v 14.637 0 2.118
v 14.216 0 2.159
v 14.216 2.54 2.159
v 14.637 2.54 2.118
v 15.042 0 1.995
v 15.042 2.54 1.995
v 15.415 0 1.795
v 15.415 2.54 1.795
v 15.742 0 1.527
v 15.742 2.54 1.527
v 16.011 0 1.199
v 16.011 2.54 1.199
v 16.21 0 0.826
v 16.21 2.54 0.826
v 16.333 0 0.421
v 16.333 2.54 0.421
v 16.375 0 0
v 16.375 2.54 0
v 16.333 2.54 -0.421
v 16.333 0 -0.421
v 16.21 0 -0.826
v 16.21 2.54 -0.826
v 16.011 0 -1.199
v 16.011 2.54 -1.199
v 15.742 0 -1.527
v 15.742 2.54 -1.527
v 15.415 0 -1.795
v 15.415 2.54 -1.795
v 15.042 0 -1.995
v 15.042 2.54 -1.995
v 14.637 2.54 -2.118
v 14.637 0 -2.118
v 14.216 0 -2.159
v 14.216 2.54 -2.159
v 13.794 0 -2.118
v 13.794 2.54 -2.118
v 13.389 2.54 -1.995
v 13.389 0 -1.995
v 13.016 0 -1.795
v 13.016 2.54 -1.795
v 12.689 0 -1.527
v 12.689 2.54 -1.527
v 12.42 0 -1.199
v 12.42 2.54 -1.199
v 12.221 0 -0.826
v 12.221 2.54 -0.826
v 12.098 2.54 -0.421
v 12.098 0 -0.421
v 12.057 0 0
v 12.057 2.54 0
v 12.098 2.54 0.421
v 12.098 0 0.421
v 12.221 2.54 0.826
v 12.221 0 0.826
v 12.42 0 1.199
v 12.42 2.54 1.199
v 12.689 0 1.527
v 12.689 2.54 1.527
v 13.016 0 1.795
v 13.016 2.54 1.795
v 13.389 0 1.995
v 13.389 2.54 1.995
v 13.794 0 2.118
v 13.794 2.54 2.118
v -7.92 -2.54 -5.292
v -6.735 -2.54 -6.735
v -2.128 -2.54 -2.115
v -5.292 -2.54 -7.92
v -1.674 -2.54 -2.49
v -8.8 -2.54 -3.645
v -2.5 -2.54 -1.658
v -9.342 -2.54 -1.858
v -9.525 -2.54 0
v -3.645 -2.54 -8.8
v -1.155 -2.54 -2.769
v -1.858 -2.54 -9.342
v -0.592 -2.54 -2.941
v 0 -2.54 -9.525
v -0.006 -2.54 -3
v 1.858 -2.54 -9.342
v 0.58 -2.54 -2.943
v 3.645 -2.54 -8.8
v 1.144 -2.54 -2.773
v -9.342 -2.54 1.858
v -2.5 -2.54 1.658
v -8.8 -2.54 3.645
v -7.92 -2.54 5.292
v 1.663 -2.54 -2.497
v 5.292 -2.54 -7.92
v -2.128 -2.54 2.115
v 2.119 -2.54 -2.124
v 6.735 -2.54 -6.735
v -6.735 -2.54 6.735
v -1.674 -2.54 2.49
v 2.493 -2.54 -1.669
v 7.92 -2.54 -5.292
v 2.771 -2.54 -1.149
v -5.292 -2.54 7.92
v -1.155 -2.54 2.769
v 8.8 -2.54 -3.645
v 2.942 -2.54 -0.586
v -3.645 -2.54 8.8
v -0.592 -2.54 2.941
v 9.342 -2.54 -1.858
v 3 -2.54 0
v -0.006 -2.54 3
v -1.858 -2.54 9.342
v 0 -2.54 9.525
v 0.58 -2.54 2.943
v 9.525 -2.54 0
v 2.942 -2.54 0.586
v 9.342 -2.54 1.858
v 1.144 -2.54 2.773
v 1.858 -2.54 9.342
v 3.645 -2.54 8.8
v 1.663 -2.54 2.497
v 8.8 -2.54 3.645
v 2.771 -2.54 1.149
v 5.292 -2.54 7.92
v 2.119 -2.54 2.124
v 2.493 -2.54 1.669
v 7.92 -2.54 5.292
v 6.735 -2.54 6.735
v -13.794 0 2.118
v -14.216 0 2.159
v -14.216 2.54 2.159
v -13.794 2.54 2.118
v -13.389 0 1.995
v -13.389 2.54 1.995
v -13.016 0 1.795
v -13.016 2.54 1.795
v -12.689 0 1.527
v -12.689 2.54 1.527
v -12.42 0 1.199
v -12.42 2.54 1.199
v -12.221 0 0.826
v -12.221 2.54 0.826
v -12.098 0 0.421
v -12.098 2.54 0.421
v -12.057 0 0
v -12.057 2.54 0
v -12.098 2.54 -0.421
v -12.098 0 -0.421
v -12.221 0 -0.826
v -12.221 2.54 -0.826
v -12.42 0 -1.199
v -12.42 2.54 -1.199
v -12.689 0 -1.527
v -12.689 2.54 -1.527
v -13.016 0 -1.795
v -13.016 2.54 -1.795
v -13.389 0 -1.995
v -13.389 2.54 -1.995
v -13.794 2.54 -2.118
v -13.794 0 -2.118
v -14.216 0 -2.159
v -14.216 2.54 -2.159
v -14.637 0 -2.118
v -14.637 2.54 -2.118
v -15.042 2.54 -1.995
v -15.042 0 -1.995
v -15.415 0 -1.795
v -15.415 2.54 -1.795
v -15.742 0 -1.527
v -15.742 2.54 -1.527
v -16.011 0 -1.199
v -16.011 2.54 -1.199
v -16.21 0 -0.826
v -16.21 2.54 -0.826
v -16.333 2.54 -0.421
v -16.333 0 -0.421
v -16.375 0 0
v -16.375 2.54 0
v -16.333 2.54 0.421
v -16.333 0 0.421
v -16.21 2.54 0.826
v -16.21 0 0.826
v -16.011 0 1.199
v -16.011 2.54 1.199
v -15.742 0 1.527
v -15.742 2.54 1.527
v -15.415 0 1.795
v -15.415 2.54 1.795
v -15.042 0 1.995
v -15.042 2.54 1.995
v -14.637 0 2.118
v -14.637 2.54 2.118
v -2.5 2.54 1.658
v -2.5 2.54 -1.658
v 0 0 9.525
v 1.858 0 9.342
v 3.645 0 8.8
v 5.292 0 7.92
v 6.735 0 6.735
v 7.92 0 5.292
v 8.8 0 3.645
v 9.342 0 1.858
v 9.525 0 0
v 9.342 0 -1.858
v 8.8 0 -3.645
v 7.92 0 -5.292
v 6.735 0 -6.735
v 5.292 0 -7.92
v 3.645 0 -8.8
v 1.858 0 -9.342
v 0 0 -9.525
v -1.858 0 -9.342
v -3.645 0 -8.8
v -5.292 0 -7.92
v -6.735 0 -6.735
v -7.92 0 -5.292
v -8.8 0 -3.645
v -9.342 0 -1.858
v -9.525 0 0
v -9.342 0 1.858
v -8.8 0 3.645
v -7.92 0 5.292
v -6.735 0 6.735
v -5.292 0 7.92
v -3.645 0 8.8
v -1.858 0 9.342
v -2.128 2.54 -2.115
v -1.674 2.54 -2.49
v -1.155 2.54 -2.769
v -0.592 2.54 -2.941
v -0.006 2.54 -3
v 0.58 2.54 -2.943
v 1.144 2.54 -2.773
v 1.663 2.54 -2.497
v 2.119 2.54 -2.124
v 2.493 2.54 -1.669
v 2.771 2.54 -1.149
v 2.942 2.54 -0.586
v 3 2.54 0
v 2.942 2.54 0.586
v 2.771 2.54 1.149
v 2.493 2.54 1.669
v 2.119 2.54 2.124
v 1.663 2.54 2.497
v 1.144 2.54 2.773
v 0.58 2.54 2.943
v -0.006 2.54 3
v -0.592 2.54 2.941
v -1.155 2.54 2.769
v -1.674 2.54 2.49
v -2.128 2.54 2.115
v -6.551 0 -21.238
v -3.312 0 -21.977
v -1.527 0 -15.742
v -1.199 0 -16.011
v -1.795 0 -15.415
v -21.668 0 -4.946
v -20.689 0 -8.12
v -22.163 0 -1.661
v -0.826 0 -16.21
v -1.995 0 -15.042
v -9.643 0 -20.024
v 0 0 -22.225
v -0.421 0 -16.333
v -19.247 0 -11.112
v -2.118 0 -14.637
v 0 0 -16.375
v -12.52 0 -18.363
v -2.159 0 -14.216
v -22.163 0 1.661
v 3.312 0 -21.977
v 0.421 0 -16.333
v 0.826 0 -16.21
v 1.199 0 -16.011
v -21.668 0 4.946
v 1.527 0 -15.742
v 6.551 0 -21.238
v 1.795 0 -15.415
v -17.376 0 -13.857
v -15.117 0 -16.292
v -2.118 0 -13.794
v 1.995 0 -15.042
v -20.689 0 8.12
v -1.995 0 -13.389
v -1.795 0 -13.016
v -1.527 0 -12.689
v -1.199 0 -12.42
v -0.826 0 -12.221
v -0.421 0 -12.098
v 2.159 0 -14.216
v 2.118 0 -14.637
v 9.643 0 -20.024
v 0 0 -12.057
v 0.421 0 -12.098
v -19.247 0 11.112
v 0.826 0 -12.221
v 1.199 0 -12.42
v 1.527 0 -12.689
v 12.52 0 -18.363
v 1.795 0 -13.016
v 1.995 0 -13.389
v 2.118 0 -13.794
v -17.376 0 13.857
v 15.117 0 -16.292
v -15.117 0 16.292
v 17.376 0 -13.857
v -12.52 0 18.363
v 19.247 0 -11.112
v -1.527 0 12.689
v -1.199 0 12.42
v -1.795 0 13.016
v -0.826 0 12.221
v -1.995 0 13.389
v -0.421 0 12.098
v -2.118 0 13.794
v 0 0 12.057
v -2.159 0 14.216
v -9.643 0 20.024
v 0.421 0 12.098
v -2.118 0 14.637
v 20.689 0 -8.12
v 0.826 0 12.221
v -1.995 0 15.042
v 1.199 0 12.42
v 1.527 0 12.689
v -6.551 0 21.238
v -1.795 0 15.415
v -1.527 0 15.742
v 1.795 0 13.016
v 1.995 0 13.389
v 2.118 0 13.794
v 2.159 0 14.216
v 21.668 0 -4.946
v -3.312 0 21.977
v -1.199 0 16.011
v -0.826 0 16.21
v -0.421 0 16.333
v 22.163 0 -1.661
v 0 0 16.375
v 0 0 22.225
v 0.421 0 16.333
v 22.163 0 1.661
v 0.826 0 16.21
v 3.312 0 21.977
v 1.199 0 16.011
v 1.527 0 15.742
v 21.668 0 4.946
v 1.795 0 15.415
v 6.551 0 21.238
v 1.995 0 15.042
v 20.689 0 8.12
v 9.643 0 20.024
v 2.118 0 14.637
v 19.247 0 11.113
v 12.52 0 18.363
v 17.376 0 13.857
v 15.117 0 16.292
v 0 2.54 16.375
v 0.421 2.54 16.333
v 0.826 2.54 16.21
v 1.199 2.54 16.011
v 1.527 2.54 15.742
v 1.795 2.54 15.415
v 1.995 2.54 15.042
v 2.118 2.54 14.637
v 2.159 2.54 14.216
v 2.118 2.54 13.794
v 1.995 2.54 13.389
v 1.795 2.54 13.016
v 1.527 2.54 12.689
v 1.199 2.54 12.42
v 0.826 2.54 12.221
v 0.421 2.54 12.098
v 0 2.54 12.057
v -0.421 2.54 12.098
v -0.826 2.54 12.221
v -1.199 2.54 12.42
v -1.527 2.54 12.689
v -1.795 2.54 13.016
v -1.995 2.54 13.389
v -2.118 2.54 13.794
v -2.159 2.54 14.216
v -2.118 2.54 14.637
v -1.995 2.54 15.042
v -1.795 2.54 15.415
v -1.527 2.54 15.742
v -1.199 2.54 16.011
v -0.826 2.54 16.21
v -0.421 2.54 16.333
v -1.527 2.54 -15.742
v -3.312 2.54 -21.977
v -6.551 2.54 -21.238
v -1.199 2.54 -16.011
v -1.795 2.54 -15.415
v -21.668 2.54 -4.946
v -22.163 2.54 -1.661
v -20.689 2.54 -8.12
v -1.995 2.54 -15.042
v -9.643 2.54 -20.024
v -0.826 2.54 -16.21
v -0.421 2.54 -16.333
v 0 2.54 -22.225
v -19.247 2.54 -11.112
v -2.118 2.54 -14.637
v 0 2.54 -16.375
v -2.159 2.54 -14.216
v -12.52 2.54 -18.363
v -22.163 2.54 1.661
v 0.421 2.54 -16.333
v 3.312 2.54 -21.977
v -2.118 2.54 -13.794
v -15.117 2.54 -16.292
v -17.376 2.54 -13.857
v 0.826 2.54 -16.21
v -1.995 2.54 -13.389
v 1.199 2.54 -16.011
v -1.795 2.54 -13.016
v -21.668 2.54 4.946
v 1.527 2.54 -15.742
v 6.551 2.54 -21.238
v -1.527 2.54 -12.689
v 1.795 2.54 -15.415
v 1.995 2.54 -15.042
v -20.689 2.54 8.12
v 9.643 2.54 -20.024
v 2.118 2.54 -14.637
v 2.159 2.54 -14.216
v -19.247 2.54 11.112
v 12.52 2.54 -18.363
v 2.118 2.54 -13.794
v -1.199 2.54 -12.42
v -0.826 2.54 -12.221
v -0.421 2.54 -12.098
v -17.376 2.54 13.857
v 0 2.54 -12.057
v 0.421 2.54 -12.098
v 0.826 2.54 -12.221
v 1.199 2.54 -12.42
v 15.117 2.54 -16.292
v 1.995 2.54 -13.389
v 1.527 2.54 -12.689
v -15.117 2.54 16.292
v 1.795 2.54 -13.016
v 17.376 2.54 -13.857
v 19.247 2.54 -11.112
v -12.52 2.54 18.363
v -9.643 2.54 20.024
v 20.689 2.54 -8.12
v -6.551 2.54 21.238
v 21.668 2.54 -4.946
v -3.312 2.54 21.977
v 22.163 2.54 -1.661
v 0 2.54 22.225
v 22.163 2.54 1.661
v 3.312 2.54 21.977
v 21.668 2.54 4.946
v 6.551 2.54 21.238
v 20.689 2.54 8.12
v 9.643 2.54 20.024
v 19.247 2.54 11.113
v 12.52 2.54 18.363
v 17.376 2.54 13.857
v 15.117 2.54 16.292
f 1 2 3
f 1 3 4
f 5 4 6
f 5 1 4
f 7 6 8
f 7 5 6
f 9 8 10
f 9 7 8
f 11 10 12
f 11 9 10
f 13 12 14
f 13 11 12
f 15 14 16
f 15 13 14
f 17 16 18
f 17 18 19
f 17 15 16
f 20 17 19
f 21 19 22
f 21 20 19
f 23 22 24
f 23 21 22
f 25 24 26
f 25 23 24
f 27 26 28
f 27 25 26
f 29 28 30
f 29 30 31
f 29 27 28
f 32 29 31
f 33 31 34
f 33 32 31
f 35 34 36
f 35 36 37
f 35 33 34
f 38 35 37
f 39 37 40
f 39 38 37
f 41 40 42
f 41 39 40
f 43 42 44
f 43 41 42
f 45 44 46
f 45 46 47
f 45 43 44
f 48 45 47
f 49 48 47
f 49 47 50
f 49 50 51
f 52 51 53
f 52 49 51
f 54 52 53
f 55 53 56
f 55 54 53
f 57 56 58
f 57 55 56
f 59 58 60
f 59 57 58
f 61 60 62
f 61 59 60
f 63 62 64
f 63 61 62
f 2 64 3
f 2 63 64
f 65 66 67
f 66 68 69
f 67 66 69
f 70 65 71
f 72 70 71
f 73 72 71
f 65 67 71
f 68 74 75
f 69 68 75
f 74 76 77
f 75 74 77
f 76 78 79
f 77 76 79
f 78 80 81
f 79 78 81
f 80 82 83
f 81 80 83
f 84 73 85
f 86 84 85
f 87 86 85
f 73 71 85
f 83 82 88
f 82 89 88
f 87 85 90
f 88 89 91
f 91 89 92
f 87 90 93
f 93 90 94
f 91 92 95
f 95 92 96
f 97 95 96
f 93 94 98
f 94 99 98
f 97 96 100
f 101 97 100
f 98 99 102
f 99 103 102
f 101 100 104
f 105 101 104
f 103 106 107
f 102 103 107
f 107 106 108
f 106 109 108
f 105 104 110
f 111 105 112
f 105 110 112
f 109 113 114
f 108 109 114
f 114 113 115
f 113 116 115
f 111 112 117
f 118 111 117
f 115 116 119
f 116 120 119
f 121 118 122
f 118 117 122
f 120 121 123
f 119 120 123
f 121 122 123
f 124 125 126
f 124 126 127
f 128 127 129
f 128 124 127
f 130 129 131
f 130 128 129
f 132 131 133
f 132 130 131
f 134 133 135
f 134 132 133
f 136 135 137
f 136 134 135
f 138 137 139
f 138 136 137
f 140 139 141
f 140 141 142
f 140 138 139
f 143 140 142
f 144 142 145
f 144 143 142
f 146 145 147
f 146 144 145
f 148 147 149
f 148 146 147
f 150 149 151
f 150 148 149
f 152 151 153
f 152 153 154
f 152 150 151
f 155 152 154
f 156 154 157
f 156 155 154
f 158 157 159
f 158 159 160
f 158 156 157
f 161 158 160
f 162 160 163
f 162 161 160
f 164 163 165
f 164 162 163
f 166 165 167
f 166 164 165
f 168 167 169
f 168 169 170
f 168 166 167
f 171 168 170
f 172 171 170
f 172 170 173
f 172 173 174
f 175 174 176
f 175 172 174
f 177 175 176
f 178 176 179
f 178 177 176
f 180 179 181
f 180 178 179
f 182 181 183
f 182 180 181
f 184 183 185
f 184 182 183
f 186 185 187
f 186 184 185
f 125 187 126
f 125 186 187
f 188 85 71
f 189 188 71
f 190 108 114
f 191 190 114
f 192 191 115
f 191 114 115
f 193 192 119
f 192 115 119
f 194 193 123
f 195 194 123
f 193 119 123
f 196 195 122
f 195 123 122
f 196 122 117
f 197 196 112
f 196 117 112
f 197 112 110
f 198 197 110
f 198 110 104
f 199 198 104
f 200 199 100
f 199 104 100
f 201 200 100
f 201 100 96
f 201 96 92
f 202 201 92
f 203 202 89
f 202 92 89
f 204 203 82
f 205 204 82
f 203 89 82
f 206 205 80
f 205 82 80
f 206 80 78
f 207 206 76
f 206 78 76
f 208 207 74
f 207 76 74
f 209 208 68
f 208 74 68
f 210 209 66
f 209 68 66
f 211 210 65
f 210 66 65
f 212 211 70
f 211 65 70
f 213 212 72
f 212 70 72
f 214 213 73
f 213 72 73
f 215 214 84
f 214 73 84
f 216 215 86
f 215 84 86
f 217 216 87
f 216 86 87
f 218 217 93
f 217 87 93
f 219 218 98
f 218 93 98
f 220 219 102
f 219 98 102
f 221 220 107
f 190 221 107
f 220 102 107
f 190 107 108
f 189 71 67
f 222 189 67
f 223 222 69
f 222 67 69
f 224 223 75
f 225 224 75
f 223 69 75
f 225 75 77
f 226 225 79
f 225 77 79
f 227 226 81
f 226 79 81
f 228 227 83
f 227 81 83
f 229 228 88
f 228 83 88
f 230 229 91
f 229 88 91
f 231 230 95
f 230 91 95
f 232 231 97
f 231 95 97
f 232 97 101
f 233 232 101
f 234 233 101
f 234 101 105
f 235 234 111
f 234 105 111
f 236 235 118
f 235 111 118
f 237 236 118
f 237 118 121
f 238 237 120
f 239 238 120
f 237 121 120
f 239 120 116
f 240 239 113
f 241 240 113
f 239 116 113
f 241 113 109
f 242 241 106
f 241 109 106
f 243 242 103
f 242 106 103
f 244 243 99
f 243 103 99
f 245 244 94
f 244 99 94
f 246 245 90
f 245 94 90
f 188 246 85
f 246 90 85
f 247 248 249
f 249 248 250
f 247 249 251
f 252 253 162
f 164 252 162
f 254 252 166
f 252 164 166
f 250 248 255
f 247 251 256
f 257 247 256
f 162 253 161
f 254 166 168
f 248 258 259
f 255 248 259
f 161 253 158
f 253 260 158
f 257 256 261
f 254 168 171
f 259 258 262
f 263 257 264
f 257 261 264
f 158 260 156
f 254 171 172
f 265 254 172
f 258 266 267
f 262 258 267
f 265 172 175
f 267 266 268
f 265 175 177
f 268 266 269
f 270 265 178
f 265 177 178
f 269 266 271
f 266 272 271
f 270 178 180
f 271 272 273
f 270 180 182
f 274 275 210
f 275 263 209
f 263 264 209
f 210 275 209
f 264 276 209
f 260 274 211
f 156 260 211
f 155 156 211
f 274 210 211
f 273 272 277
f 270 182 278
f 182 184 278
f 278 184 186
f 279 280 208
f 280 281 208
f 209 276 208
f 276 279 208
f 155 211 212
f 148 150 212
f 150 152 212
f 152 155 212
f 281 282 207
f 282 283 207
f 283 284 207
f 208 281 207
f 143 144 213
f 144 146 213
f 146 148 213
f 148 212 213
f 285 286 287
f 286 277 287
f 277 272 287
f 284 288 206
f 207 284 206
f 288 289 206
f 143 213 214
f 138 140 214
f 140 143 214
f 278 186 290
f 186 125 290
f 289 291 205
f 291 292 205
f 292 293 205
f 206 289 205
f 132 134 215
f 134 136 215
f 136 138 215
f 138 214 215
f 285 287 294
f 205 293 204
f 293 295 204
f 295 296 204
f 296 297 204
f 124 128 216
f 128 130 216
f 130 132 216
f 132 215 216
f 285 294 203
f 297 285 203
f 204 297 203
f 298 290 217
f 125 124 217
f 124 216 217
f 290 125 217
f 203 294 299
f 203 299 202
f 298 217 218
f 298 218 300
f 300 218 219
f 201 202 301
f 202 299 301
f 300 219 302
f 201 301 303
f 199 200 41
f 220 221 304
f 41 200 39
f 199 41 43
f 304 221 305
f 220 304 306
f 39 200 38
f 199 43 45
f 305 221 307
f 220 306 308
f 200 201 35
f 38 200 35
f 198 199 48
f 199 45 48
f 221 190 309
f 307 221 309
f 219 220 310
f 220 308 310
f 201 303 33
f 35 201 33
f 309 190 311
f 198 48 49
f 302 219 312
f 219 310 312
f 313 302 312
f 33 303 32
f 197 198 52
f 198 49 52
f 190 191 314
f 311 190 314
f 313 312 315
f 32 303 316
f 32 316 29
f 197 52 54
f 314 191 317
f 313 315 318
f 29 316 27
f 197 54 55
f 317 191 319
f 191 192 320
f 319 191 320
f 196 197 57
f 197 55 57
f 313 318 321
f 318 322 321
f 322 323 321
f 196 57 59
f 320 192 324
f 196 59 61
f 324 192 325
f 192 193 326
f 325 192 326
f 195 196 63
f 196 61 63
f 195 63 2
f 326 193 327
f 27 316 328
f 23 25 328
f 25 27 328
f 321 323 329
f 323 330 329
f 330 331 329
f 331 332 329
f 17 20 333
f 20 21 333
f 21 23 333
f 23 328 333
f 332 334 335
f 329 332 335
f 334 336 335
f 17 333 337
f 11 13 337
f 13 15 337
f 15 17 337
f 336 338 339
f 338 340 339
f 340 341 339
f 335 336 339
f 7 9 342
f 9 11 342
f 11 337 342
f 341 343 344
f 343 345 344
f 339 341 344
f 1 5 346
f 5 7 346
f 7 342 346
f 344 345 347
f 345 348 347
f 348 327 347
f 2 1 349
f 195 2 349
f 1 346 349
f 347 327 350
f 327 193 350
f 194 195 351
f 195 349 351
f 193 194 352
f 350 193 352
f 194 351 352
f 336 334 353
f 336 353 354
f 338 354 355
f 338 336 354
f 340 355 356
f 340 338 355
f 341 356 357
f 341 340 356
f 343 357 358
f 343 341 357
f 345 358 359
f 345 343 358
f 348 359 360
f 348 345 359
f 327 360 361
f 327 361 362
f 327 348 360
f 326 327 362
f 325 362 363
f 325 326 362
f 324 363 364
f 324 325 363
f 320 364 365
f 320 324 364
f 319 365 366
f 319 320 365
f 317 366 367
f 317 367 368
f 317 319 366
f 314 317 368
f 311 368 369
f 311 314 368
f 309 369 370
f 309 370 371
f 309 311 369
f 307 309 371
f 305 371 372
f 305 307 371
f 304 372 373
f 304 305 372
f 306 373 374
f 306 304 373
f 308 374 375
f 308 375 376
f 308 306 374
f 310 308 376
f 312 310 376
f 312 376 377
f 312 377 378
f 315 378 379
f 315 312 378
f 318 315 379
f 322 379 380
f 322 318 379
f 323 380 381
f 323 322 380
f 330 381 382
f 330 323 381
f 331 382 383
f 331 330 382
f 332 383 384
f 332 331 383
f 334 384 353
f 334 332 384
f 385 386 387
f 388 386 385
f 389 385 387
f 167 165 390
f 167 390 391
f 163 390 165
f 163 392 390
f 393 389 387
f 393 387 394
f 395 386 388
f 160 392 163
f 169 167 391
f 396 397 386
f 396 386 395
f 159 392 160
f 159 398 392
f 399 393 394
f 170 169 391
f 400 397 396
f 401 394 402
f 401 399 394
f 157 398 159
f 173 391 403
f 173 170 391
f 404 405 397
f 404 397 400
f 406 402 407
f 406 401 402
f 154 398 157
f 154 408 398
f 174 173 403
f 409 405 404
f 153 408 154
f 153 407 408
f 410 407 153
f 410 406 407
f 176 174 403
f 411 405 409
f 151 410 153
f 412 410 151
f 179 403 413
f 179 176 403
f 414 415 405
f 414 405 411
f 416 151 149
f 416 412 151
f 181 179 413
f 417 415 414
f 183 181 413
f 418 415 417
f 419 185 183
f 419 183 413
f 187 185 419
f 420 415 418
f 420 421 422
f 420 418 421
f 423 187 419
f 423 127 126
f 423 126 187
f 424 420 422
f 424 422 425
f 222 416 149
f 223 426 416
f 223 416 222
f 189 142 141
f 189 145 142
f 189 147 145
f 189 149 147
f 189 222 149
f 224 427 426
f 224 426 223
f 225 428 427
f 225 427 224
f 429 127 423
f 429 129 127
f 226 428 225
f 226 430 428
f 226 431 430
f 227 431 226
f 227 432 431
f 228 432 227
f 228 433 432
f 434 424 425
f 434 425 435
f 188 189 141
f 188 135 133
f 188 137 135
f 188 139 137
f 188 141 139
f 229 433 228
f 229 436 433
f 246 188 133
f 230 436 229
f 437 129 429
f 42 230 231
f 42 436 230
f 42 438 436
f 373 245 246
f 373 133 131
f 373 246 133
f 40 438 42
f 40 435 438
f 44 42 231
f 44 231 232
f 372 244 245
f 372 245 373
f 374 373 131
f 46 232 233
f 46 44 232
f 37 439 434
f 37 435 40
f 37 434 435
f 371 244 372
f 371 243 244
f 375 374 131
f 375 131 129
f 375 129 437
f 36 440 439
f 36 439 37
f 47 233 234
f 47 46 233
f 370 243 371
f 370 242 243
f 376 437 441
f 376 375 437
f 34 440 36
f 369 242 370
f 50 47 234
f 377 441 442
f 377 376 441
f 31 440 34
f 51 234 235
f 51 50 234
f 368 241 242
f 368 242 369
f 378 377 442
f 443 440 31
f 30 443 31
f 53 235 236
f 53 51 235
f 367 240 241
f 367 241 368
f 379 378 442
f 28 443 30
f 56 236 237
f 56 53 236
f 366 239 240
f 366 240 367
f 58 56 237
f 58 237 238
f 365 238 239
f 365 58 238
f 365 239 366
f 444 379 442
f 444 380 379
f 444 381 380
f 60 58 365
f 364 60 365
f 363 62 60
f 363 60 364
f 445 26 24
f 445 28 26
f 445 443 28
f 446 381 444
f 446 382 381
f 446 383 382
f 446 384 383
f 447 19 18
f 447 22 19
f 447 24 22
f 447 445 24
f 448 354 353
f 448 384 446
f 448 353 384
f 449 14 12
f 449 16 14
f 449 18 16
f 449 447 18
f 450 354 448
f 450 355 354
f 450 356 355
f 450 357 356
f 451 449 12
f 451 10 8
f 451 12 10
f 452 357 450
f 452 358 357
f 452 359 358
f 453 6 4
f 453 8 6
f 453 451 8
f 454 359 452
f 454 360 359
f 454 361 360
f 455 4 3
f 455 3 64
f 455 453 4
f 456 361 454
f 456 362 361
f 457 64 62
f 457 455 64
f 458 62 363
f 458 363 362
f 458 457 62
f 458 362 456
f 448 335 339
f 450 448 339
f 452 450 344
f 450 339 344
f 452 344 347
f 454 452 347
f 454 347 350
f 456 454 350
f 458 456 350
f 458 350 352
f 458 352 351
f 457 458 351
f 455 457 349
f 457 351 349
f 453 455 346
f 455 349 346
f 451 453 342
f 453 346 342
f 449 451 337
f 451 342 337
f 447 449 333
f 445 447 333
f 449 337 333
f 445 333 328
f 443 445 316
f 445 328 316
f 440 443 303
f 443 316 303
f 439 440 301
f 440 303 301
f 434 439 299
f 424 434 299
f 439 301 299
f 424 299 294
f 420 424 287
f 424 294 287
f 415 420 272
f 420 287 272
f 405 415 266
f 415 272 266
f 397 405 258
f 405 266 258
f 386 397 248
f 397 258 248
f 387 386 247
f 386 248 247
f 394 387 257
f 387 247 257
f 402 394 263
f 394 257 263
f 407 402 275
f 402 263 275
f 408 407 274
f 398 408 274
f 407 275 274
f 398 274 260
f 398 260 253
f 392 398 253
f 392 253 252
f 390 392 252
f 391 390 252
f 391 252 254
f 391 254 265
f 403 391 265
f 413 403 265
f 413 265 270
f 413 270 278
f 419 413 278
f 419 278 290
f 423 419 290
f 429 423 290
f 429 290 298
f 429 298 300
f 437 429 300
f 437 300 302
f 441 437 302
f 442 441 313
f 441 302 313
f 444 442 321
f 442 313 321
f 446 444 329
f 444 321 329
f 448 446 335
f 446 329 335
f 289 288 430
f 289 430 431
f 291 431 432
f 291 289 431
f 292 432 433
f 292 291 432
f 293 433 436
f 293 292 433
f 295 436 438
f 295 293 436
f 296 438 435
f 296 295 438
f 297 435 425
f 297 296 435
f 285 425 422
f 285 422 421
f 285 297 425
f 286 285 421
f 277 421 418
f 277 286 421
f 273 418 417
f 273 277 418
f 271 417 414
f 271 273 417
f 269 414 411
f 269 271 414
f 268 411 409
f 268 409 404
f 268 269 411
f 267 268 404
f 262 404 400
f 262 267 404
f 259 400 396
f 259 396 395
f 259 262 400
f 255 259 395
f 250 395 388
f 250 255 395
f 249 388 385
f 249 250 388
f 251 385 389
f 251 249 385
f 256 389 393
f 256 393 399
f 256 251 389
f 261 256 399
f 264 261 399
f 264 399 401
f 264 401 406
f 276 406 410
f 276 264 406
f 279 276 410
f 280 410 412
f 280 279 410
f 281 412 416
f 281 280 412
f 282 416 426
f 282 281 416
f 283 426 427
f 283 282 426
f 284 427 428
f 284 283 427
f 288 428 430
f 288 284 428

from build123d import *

# Parameters (mm, degrees)
SKETCH1_R           = 22.225
SKETCH1_R_2         = 2.159
BOSS_EXTRUDE1_DEPTH = 2.54
BOSS_EXTRUDE2_START = -2.54
SKETCH1_4_R         = 9.525
BOSS_EXTRUDE2_DEPTH = 2.54


with BuildPart() as part:
    # Sketch1 → Boss-Extrude1 (new body)
    with BuildSketch(Plane(origin=(0, 0, 0), x_dir=(1, 0, 0), z_dir=(0, 1, 0))):
        Circle(SKETCH1_R)
        with BuildLine():
            Line((-2.5, -1.658312395), (-2.5, 1.658312395))
            ThreePointArc((-2.5, 1.658312395), (3, 0), (-2.5, -1.658312395))
        make_face(mode=Mode.SUBTRACT)
        with Locations((0, -14.21564213)):
            Circle(SKETCH1_R_2, mode=Mode.SUBTRACT)
        with Locations((14.21564213, 0)):
            Circle(SKETCH1_R_2, mode=Mode.SUBTRACT)
        with Locations((-14.21564213, 0)):
            Circle(SKETCH1_R_2, mode=Mode.SUBTRACT)
        with Locations((0, 14.21564213)):
            Circle(SKETCH1_R_2, mode=Mode.SUBTRACT)
    extrude(amount=BOSS_EXTRUDE1_DEPTH)

    # Sketch1<4> → Boss-Extrude2 (add)
    with BuildSketch(Plane(origin=(0, 0, 0), x_dir=(1, 0, 0), z_dir=(0, 1, 0)).offset(BOSS_EXTRUDE2_START)):
        Circle(SKETCH1_4_R)
        with BuildLine():
            Line((-2.5, -1.658312395), (-2.5, 1.658312395))
            ThreePointArc((-2.5, 1.658312395), (3, 0), (-2.5, -1.658312395))
        make_face(mode=Mode.SUBTRACT)
    extrude(amount=BOSS_EXTRUDE2_DEPTH)


solid = part.part
